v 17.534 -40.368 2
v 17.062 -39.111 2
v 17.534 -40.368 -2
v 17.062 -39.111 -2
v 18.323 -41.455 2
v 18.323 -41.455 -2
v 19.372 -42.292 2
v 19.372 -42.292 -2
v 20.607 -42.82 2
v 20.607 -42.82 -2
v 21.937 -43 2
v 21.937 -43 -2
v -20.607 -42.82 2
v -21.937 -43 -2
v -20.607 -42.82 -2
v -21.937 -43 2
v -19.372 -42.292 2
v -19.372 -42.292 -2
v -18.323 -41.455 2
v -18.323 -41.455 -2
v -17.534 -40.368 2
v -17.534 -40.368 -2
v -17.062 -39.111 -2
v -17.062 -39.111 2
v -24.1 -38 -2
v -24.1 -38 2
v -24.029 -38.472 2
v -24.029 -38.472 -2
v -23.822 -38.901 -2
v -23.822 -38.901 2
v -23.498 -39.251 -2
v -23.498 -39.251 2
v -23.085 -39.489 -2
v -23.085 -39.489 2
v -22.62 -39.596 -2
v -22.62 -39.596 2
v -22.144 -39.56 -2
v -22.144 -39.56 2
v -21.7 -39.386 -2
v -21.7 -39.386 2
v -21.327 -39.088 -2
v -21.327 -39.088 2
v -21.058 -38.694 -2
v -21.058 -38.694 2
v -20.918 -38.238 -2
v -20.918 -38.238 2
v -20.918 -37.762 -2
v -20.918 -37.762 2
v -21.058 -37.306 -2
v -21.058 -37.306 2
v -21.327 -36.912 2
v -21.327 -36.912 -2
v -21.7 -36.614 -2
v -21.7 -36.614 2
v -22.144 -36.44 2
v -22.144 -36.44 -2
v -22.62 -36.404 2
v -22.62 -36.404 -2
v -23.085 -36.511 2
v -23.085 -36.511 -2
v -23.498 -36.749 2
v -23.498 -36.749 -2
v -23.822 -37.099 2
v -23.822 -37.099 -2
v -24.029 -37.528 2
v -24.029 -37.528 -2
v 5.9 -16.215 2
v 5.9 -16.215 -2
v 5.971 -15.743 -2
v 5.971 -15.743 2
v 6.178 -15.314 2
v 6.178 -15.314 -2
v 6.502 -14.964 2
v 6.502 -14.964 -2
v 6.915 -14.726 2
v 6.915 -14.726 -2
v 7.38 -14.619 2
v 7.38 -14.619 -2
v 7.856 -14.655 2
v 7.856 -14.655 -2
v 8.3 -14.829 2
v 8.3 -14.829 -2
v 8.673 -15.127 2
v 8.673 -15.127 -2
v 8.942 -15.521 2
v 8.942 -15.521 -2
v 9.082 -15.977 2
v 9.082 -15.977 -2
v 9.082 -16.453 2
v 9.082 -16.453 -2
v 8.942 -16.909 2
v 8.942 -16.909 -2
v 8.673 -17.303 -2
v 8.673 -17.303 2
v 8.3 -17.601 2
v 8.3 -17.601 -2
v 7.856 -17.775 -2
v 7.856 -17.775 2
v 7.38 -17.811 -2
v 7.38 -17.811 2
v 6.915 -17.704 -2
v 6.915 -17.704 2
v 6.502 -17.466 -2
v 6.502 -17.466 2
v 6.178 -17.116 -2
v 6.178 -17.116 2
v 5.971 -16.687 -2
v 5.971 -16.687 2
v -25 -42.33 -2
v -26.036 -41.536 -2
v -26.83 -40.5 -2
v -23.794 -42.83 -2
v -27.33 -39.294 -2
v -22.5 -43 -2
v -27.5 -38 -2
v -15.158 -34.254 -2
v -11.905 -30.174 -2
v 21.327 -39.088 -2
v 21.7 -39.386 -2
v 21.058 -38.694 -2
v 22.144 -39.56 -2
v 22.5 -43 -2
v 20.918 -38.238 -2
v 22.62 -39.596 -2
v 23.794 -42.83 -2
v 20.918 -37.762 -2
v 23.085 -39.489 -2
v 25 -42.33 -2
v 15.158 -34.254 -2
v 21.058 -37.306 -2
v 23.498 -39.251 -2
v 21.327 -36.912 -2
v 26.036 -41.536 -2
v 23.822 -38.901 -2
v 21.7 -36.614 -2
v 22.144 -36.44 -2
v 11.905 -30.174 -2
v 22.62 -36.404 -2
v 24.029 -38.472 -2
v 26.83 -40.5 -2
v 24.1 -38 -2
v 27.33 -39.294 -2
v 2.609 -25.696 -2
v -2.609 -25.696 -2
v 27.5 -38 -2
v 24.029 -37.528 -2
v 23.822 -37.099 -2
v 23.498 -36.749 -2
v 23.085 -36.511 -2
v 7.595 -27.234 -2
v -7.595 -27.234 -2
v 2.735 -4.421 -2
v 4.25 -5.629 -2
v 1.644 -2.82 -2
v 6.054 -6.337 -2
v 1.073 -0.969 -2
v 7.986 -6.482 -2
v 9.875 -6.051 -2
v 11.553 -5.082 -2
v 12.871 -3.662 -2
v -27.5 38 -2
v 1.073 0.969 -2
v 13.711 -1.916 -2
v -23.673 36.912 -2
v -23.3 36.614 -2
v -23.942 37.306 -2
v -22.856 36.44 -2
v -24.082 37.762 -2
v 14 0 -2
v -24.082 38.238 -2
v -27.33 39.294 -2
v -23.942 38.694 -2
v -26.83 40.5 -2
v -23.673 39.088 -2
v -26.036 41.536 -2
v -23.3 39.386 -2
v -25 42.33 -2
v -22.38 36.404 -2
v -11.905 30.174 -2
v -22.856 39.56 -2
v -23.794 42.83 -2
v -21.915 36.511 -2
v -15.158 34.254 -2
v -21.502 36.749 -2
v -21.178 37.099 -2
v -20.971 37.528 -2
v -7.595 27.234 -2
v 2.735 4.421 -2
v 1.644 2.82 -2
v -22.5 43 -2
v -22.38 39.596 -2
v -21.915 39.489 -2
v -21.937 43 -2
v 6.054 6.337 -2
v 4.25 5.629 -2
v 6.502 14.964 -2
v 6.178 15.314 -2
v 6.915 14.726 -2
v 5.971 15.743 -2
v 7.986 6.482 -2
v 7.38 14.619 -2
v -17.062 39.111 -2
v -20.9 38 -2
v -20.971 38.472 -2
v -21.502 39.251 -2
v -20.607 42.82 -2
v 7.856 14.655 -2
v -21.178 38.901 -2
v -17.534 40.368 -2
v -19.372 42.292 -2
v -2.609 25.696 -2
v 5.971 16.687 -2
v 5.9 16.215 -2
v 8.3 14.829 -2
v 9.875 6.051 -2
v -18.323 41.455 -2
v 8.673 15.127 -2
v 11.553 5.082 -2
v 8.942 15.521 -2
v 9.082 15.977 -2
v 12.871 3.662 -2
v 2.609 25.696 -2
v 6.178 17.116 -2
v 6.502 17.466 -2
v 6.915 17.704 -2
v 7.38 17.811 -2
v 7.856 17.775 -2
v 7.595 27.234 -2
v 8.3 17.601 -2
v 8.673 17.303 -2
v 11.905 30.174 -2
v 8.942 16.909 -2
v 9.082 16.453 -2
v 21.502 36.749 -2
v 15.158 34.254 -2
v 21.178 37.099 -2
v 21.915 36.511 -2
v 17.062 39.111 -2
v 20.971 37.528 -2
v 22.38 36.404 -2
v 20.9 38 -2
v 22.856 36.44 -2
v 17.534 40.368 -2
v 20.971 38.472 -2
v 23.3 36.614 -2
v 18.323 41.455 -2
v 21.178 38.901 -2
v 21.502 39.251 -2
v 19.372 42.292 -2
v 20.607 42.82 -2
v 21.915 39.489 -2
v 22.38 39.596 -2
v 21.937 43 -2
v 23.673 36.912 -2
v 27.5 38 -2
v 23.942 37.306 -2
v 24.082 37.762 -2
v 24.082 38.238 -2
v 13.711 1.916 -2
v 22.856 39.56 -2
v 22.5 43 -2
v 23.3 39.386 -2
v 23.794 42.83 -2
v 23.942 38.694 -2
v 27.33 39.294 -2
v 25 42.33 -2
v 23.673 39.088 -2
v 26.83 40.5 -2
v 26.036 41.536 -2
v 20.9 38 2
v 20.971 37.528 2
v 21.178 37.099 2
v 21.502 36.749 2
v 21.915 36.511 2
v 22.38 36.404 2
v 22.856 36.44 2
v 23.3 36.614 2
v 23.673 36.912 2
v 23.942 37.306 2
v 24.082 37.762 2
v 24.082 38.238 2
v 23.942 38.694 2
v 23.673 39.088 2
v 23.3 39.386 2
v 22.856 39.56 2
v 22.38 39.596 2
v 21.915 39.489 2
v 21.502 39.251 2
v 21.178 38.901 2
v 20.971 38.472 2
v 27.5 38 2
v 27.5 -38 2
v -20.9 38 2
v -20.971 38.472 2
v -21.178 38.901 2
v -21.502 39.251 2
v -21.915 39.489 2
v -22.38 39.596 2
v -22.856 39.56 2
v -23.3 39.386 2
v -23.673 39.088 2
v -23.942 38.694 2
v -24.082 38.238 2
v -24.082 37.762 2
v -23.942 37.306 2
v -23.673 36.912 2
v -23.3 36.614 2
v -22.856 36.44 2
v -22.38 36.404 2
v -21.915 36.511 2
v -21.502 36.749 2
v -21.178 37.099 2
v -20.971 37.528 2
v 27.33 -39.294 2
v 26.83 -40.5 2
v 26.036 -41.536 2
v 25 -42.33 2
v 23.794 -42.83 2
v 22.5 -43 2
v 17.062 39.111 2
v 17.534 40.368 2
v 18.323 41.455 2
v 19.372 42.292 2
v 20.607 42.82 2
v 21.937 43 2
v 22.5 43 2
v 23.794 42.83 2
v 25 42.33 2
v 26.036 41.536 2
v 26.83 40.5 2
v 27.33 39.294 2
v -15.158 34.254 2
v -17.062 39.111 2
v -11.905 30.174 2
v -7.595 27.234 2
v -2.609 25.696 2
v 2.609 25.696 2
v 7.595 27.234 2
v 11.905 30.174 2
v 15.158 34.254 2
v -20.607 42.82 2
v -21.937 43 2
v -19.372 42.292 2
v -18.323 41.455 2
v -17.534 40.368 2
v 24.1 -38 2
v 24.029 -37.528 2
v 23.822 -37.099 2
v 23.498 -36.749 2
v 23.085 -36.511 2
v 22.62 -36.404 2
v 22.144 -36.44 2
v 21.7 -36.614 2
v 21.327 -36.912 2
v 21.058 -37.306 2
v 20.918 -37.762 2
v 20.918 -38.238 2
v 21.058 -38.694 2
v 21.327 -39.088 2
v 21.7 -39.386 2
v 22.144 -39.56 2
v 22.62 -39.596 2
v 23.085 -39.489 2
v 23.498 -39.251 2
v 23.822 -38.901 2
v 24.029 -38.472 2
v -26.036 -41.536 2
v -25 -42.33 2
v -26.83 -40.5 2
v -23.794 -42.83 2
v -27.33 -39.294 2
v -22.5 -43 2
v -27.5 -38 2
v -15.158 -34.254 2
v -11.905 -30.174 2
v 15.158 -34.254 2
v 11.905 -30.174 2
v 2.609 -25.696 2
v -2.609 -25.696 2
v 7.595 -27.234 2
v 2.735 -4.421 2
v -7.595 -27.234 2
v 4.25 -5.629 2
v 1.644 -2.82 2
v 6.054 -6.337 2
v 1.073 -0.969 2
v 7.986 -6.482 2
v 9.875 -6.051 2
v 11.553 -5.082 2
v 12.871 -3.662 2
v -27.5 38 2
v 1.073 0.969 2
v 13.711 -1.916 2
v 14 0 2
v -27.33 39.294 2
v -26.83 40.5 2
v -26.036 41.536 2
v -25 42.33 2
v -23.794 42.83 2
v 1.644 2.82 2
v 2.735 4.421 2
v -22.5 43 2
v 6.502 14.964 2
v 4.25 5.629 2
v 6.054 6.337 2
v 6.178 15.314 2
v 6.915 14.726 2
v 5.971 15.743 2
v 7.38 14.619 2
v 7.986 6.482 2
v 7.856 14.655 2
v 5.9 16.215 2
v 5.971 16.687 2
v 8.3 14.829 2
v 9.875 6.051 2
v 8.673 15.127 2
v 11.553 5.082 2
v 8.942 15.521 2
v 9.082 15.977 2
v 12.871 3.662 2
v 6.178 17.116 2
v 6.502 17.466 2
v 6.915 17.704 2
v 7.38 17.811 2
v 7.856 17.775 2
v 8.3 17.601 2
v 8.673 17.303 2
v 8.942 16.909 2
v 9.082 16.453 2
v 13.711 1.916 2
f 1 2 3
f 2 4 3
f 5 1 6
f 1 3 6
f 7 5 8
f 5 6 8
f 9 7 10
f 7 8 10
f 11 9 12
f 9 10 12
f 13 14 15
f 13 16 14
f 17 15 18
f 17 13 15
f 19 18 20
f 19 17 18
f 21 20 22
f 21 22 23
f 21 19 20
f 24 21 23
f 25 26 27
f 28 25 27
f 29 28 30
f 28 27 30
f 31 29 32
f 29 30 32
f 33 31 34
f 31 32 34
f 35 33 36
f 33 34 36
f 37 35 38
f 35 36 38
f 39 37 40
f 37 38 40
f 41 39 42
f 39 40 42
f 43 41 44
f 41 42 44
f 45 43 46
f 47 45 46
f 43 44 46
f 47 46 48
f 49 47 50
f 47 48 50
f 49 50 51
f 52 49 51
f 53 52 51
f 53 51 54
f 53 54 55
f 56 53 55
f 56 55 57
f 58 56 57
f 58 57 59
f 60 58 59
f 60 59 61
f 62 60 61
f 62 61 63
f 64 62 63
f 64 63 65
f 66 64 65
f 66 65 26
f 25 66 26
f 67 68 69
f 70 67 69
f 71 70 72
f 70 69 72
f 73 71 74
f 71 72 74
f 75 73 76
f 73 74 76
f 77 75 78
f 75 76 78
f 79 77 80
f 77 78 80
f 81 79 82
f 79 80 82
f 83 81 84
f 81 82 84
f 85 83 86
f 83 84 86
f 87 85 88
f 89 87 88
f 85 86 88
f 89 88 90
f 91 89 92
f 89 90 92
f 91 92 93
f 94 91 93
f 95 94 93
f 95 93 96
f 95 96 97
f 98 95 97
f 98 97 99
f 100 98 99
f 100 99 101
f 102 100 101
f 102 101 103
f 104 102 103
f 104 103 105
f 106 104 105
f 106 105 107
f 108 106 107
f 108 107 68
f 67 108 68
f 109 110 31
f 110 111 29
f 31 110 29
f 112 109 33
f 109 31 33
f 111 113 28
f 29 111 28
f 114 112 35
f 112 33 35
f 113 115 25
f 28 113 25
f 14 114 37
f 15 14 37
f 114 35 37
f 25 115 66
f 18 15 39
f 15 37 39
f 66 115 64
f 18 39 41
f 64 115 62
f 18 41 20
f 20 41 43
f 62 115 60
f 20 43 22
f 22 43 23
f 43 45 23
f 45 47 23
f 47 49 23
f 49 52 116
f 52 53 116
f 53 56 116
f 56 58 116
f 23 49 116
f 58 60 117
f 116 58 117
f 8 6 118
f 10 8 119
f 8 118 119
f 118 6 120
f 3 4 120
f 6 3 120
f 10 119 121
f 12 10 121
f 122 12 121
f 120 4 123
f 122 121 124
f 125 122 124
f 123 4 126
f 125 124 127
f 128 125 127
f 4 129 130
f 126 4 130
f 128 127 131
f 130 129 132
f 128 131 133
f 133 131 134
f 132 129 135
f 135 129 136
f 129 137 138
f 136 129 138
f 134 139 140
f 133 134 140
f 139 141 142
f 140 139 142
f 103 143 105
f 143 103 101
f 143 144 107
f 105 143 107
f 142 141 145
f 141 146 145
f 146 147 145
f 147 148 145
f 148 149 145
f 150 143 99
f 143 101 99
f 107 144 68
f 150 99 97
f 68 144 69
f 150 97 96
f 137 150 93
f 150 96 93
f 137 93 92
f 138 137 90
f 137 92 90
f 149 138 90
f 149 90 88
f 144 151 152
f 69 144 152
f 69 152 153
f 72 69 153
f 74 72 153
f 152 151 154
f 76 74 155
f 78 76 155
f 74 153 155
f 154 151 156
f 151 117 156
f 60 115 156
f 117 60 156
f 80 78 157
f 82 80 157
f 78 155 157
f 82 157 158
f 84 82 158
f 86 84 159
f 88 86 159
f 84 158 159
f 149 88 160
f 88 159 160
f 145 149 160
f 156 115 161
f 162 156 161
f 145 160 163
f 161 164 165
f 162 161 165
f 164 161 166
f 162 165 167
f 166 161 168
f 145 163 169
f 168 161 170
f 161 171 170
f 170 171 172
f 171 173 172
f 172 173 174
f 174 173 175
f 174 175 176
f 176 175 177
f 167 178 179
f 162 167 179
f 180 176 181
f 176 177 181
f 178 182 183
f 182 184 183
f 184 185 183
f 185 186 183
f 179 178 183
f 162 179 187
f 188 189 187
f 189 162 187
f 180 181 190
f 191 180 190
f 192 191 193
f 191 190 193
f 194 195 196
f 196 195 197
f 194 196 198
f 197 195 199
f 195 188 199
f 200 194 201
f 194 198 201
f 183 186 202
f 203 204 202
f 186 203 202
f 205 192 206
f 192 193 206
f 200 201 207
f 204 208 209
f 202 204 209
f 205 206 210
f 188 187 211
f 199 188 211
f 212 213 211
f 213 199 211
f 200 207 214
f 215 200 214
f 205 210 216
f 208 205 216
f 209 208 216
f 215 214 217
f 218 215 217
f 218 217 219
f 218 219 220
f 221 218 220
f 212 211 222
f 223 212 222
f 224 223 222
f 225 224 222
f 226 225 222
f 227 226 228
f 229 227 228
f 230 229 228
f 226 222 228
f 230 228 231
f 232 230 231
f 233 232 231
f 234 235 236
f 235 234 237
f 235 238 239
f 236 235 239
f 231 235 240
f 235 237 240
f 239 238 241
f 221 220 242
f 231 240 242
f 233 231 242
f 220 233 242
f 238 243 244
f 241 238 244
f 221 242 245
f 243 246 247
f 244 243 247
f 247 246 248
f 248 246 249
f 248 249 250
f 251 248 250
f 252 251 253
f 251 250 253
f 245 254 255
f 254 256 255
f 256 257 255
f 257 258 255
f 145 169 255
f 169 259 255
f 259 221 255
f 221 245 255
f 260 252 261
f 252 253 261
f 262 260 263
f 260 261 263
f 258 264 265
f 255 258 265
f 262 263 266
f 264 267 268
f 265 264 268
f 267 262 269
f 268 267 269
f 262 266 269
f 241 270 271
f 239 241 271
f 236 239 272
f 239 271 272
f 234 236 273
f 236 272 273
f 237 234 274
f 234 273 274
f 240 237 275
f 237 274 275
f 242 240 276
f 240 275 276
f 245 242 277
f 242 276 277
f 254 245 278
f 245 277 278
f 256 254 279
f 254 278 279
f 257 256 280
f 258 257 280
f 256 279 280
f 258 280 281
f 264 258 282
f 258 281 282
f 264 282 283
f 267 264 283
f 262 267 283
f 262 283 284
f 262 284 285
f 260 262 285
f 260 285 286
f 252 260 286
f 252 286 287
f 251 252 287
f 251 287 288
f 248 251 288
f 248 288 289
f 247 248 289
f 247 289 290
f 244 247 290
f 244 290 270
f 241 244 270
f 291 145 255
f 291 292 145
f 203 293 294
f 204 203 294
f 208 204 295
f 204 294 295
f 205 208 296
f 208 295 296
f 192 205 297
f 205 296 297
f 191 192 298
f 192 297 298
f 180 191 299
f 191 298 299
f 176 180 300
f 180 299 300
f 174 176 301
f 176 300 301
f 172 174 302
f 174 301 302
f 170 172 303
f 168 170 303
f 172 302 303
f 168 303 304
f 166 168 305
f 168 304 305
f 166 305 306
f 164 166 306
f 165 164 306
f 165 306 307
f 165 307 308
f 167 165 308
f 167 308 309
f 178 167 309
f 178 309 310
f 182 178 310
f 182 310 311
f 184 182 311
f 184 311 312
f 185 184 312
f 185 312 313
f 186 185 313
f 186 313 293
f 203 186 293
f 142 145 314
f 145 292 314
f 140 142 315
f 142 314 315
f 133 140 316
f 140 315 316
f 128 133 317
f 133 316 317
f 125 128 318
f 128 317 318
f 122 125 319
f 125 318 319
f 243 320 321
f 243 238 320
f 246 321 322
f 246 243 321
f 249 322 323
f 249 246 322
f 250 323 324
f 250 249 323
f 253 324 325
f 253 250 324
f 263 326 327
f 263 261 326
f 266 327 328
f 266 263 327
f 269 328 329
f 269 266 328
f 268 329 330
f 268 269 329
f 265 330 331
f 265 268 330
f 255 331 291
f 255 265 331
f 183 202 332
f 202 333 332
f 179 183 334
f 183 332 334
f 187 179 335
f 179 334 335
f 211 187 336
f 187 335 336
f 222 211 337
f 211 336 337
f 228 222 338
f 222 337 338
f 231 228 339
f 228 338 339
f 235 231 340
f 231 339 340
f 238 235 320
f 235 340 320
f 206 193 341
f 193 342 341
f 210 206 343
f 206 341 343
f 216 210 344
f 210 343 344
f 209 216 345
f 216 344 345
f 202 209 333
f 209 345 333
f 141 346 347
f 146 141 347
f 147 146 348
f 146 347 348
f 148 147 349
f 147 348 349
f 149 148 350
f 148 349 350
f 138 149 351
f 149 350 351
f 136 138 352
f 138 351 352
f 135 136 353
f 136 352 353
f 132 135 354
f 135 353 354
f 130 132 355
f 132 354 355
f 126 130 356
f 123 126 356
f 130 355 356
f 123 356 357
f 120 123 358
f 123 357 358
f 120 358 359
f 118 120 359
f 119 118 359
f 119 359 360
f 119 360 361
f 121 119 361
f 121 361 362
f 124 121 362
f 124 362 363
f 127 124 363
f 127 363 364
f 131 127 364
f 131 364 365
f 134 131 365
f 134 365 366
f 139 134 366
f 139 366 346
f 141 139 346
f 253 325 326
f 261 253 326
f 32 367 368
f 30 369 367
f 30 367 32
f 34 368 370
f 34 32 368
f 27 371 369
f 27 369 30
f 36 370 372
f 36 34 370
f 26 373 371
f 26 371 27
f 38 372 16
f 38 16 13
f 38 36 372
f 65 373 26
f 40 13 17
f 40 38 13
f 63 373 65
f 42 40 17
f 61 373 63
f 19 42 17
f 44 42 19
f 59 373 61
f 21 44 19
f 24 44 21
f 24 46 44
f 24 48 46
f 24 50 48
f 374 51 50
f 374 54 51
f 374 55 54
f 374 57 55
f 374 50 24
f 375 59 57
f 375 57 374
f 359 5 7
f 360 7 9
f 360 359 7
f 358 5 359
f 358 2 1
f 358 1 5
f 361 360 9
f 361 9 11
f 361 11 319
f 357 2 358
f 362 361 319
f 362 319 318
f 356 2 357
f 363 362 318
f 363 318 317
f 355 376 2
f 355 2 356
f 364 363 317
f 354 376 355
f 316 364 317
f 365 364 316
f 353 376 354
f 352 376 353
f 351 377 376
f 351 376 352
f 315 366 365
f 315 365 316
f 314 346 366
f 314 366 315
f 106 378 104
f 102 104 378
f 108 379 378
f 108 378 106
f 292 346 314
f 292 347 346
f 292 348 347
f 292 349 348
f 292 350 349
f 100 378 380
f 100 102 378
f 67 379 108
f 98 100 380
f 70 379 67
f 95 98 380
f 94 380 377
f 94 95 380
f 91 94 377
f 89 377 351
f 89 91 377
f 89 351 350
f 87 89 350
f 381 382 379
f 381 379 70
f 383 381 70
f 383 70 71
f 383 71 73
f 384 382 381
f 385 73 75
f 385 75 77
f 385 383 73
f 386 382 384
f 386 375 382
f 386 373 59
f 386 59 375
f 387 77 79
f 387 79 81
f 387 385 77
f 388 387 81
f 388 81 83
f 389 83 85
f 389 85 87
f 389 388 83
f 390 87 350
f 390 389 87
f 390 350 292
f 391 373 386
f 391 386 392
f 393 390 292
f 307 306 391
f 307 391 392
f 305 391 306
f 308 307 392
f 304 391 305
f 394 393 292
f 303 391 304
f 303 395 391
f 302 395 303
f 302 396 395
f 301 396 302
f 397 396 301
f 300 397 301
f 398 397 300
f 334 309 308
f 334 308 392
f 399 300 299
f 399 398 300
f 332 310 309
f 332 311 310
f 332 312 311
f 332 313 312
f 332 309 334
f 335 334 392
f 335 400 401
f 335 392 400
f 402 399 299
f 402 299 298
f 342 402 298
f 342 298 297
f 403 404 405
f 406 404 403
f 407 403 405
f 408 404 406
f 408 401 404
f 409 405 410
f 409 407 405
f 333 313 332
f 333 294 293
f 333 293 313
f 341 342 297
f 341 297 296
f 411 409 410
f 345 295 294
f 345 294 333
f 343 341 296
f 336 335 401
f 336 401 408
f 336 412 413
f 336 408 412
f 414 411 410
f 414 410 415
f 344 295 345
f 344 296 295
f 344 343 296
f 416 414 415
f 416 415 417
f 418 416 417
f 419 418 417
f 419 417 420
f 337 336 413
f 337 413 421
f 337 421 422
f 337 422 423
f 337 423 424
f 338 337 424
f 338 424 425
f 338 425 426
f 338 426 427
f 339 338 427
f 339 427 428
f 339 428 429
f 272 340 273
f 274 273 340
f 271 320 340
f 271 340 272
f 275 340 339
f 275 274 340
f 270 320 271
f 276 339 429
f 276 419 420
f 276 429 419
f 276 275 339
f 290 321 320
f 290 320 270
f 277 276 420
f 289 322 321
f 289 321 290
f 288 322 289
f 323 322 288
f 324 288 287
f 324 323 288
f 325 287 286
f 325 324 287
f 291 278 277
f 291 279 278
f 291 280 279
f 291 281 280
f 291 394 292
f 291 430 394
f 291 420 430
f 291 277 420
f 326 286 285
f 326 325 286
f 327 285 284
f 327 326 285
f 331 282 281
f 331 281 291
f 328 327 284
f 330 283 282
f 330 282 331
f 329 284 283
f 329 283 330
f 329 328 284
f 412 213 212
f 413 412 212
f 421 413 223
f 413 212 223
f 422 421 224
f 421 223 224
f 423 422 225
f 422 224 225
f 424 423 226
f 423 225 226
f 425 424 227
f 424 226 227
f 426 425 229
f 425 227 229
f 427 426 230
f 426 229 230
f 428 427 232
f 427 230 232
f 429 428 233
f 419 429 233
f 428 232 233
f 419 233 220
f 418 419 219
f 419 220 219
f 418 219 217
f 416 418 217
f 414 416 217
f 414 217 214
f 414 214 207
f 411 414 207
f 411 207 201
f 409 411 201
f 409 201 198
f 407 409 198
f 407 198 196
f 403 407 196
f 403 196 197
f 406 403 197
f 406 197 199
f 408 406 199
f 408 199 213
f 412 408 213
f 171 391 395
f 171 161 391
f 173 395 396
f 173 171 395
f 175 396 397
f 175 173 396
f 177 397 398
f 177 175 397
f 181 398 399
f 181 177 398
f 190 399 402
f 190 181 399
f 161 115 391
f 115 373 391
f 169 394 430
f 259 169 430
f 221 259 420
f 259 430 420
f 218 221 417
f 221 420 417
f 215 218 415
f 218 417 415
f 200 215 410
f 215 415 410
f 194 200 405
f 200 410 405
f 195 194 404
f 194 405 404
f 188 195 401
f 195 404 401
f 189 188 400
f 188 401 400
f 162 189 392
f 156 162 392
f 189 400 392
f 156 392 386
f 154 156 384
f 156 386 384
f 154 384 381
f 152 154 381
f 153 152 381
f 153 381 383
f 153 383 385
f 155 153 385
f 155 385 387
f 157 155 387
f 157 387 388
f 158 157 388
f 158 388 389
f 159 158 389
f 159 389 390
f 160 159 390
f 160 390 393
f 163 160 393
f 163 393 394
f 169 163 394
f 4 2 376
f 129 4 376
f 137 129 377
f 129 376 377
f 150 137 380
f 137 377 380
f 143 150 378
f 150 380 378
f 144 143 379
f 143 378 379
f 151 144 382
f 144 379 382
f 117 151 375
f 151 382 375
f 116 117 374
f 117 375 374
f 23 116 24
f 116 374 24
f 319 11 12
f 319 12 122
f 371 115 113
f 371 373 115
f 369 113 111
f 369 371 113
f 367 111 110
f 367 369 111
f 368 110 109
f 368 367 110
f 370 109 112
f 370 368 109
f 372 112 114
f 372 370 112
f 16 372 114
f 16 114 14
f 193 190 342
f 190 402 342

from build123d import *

# Parameters (mm, degrees)
SKETCH_1_W          = 55
SKETCH_1_H          = 86
EXTRUDE_1_DEPTH     = 2
SKETCH_2_R          = 6.5
CUT_EXTRUDE_1_DEPTH = 52.198144498
SKETCH_3_R          = 1.6
CUT_EXTRUDE_2_DEPTH = 52.198144498
SKETCH_4_R          = 1.6
CUT_EXTRUDE_3_DEPTH = 52.198144498
SKETCH_7_R          = 17.5
CUT_EXTRUDE_6_DEPTH = 52.198144498
FILLET_2_R          = 5


with BuildPart() as part:
    # ｽｹｯﾁ1 → ﾎﾞｽ - 押し出し1 (new, symmetric)
    with BuildSketch(Plane.XY):
        Rectangle(SKETCH_1_W, SKETCH_1_H)
    extrude(amount=EXTRUDE_1_DEPTH, both=True)

    # ｽｹｯﾁ2 → ｶｯﾄ - 押し出し1 (cut, through all)
    with BuildSketch(Plane.XY.offset(2)):
        with Locations((7.5, 0)):
            Circle(SKETCH_2_R)
    extrude(amount=-CUT_EXTRUDE_1_DEPTH, mode=Mode.SUBTRACT)

    # ｽｹｯﾁ3 → ｶｯﾄ - 押し出し2 (cut, through all)
    with BuildSketch(Plane.XY.offset(2)):
        with Locations((-22.5, 38)):
            Circle(SKETCH_3_R)
        with Locations(Location((22.5, 38, 0), (0, 0, 180))):
            Circle(SKETCH_3_R)
        with Locations((22.5, -38)):
            Circle(SKETCH_3_R)
        with Locations(Location((-22.5, -38, 0), (0, 0, 180))):
            Circle(SKETCH_3_R)
    extrude(amount=-CUT_EXTRUDE_2_DEPTH, mode=Mode.SUBTRACT)

    # ｽｹｯﾁ4 → ｶｯﾄ - 押し出し3 (cut, through all)
    with BuildSketch(Plane(origin=(0, 0, -2), x_dir=(-1, 0, 0), z_dir=(0, 0, -1))):
        with Locations((-7.5, 16.215)):
            Circle(SKETCH_4_R)
        with Locations((-7.5, -16.215)):
            Circle(SKETCH_4_R)
    extrude(amount=-CUT_EXTRUDE_3_DEPTH, mode=Mode.SUBTRACT)

    # ｽｹｯﾁ7 → ｶｯﾄ - 押し出し6 (cut, through all)
    with BuildSketch(Plane.XY.offset(2)):
        with Locations((0, 43)):
            Circle(SKETCH_7_R)
        with Locations((0, -43)):
            Circle(SKETCH_7_R)
    extrude(amount=-CUT_EXTRUDE_6_DEPTH, mode=Mode.SUBTRACT)

    # ﾌｨﾚｯﾄ2
    fillet_2_edges = [part.edges().sort_by_distance(p)[0] for p in [
        (17.5, 43, 0),
        (-17.5, 43, 0),
        (-17.5, -43, 0),
        (17.5, -43, 0),
        (27.5, -43, 0),
        (-27.5, -43, 0),
        (-27.5, 43, 0),
        (27.5, 43, 0),
    ]]
    fillet(fillet_2_edges, radius=FILLET_2_R)


solid = part.part
